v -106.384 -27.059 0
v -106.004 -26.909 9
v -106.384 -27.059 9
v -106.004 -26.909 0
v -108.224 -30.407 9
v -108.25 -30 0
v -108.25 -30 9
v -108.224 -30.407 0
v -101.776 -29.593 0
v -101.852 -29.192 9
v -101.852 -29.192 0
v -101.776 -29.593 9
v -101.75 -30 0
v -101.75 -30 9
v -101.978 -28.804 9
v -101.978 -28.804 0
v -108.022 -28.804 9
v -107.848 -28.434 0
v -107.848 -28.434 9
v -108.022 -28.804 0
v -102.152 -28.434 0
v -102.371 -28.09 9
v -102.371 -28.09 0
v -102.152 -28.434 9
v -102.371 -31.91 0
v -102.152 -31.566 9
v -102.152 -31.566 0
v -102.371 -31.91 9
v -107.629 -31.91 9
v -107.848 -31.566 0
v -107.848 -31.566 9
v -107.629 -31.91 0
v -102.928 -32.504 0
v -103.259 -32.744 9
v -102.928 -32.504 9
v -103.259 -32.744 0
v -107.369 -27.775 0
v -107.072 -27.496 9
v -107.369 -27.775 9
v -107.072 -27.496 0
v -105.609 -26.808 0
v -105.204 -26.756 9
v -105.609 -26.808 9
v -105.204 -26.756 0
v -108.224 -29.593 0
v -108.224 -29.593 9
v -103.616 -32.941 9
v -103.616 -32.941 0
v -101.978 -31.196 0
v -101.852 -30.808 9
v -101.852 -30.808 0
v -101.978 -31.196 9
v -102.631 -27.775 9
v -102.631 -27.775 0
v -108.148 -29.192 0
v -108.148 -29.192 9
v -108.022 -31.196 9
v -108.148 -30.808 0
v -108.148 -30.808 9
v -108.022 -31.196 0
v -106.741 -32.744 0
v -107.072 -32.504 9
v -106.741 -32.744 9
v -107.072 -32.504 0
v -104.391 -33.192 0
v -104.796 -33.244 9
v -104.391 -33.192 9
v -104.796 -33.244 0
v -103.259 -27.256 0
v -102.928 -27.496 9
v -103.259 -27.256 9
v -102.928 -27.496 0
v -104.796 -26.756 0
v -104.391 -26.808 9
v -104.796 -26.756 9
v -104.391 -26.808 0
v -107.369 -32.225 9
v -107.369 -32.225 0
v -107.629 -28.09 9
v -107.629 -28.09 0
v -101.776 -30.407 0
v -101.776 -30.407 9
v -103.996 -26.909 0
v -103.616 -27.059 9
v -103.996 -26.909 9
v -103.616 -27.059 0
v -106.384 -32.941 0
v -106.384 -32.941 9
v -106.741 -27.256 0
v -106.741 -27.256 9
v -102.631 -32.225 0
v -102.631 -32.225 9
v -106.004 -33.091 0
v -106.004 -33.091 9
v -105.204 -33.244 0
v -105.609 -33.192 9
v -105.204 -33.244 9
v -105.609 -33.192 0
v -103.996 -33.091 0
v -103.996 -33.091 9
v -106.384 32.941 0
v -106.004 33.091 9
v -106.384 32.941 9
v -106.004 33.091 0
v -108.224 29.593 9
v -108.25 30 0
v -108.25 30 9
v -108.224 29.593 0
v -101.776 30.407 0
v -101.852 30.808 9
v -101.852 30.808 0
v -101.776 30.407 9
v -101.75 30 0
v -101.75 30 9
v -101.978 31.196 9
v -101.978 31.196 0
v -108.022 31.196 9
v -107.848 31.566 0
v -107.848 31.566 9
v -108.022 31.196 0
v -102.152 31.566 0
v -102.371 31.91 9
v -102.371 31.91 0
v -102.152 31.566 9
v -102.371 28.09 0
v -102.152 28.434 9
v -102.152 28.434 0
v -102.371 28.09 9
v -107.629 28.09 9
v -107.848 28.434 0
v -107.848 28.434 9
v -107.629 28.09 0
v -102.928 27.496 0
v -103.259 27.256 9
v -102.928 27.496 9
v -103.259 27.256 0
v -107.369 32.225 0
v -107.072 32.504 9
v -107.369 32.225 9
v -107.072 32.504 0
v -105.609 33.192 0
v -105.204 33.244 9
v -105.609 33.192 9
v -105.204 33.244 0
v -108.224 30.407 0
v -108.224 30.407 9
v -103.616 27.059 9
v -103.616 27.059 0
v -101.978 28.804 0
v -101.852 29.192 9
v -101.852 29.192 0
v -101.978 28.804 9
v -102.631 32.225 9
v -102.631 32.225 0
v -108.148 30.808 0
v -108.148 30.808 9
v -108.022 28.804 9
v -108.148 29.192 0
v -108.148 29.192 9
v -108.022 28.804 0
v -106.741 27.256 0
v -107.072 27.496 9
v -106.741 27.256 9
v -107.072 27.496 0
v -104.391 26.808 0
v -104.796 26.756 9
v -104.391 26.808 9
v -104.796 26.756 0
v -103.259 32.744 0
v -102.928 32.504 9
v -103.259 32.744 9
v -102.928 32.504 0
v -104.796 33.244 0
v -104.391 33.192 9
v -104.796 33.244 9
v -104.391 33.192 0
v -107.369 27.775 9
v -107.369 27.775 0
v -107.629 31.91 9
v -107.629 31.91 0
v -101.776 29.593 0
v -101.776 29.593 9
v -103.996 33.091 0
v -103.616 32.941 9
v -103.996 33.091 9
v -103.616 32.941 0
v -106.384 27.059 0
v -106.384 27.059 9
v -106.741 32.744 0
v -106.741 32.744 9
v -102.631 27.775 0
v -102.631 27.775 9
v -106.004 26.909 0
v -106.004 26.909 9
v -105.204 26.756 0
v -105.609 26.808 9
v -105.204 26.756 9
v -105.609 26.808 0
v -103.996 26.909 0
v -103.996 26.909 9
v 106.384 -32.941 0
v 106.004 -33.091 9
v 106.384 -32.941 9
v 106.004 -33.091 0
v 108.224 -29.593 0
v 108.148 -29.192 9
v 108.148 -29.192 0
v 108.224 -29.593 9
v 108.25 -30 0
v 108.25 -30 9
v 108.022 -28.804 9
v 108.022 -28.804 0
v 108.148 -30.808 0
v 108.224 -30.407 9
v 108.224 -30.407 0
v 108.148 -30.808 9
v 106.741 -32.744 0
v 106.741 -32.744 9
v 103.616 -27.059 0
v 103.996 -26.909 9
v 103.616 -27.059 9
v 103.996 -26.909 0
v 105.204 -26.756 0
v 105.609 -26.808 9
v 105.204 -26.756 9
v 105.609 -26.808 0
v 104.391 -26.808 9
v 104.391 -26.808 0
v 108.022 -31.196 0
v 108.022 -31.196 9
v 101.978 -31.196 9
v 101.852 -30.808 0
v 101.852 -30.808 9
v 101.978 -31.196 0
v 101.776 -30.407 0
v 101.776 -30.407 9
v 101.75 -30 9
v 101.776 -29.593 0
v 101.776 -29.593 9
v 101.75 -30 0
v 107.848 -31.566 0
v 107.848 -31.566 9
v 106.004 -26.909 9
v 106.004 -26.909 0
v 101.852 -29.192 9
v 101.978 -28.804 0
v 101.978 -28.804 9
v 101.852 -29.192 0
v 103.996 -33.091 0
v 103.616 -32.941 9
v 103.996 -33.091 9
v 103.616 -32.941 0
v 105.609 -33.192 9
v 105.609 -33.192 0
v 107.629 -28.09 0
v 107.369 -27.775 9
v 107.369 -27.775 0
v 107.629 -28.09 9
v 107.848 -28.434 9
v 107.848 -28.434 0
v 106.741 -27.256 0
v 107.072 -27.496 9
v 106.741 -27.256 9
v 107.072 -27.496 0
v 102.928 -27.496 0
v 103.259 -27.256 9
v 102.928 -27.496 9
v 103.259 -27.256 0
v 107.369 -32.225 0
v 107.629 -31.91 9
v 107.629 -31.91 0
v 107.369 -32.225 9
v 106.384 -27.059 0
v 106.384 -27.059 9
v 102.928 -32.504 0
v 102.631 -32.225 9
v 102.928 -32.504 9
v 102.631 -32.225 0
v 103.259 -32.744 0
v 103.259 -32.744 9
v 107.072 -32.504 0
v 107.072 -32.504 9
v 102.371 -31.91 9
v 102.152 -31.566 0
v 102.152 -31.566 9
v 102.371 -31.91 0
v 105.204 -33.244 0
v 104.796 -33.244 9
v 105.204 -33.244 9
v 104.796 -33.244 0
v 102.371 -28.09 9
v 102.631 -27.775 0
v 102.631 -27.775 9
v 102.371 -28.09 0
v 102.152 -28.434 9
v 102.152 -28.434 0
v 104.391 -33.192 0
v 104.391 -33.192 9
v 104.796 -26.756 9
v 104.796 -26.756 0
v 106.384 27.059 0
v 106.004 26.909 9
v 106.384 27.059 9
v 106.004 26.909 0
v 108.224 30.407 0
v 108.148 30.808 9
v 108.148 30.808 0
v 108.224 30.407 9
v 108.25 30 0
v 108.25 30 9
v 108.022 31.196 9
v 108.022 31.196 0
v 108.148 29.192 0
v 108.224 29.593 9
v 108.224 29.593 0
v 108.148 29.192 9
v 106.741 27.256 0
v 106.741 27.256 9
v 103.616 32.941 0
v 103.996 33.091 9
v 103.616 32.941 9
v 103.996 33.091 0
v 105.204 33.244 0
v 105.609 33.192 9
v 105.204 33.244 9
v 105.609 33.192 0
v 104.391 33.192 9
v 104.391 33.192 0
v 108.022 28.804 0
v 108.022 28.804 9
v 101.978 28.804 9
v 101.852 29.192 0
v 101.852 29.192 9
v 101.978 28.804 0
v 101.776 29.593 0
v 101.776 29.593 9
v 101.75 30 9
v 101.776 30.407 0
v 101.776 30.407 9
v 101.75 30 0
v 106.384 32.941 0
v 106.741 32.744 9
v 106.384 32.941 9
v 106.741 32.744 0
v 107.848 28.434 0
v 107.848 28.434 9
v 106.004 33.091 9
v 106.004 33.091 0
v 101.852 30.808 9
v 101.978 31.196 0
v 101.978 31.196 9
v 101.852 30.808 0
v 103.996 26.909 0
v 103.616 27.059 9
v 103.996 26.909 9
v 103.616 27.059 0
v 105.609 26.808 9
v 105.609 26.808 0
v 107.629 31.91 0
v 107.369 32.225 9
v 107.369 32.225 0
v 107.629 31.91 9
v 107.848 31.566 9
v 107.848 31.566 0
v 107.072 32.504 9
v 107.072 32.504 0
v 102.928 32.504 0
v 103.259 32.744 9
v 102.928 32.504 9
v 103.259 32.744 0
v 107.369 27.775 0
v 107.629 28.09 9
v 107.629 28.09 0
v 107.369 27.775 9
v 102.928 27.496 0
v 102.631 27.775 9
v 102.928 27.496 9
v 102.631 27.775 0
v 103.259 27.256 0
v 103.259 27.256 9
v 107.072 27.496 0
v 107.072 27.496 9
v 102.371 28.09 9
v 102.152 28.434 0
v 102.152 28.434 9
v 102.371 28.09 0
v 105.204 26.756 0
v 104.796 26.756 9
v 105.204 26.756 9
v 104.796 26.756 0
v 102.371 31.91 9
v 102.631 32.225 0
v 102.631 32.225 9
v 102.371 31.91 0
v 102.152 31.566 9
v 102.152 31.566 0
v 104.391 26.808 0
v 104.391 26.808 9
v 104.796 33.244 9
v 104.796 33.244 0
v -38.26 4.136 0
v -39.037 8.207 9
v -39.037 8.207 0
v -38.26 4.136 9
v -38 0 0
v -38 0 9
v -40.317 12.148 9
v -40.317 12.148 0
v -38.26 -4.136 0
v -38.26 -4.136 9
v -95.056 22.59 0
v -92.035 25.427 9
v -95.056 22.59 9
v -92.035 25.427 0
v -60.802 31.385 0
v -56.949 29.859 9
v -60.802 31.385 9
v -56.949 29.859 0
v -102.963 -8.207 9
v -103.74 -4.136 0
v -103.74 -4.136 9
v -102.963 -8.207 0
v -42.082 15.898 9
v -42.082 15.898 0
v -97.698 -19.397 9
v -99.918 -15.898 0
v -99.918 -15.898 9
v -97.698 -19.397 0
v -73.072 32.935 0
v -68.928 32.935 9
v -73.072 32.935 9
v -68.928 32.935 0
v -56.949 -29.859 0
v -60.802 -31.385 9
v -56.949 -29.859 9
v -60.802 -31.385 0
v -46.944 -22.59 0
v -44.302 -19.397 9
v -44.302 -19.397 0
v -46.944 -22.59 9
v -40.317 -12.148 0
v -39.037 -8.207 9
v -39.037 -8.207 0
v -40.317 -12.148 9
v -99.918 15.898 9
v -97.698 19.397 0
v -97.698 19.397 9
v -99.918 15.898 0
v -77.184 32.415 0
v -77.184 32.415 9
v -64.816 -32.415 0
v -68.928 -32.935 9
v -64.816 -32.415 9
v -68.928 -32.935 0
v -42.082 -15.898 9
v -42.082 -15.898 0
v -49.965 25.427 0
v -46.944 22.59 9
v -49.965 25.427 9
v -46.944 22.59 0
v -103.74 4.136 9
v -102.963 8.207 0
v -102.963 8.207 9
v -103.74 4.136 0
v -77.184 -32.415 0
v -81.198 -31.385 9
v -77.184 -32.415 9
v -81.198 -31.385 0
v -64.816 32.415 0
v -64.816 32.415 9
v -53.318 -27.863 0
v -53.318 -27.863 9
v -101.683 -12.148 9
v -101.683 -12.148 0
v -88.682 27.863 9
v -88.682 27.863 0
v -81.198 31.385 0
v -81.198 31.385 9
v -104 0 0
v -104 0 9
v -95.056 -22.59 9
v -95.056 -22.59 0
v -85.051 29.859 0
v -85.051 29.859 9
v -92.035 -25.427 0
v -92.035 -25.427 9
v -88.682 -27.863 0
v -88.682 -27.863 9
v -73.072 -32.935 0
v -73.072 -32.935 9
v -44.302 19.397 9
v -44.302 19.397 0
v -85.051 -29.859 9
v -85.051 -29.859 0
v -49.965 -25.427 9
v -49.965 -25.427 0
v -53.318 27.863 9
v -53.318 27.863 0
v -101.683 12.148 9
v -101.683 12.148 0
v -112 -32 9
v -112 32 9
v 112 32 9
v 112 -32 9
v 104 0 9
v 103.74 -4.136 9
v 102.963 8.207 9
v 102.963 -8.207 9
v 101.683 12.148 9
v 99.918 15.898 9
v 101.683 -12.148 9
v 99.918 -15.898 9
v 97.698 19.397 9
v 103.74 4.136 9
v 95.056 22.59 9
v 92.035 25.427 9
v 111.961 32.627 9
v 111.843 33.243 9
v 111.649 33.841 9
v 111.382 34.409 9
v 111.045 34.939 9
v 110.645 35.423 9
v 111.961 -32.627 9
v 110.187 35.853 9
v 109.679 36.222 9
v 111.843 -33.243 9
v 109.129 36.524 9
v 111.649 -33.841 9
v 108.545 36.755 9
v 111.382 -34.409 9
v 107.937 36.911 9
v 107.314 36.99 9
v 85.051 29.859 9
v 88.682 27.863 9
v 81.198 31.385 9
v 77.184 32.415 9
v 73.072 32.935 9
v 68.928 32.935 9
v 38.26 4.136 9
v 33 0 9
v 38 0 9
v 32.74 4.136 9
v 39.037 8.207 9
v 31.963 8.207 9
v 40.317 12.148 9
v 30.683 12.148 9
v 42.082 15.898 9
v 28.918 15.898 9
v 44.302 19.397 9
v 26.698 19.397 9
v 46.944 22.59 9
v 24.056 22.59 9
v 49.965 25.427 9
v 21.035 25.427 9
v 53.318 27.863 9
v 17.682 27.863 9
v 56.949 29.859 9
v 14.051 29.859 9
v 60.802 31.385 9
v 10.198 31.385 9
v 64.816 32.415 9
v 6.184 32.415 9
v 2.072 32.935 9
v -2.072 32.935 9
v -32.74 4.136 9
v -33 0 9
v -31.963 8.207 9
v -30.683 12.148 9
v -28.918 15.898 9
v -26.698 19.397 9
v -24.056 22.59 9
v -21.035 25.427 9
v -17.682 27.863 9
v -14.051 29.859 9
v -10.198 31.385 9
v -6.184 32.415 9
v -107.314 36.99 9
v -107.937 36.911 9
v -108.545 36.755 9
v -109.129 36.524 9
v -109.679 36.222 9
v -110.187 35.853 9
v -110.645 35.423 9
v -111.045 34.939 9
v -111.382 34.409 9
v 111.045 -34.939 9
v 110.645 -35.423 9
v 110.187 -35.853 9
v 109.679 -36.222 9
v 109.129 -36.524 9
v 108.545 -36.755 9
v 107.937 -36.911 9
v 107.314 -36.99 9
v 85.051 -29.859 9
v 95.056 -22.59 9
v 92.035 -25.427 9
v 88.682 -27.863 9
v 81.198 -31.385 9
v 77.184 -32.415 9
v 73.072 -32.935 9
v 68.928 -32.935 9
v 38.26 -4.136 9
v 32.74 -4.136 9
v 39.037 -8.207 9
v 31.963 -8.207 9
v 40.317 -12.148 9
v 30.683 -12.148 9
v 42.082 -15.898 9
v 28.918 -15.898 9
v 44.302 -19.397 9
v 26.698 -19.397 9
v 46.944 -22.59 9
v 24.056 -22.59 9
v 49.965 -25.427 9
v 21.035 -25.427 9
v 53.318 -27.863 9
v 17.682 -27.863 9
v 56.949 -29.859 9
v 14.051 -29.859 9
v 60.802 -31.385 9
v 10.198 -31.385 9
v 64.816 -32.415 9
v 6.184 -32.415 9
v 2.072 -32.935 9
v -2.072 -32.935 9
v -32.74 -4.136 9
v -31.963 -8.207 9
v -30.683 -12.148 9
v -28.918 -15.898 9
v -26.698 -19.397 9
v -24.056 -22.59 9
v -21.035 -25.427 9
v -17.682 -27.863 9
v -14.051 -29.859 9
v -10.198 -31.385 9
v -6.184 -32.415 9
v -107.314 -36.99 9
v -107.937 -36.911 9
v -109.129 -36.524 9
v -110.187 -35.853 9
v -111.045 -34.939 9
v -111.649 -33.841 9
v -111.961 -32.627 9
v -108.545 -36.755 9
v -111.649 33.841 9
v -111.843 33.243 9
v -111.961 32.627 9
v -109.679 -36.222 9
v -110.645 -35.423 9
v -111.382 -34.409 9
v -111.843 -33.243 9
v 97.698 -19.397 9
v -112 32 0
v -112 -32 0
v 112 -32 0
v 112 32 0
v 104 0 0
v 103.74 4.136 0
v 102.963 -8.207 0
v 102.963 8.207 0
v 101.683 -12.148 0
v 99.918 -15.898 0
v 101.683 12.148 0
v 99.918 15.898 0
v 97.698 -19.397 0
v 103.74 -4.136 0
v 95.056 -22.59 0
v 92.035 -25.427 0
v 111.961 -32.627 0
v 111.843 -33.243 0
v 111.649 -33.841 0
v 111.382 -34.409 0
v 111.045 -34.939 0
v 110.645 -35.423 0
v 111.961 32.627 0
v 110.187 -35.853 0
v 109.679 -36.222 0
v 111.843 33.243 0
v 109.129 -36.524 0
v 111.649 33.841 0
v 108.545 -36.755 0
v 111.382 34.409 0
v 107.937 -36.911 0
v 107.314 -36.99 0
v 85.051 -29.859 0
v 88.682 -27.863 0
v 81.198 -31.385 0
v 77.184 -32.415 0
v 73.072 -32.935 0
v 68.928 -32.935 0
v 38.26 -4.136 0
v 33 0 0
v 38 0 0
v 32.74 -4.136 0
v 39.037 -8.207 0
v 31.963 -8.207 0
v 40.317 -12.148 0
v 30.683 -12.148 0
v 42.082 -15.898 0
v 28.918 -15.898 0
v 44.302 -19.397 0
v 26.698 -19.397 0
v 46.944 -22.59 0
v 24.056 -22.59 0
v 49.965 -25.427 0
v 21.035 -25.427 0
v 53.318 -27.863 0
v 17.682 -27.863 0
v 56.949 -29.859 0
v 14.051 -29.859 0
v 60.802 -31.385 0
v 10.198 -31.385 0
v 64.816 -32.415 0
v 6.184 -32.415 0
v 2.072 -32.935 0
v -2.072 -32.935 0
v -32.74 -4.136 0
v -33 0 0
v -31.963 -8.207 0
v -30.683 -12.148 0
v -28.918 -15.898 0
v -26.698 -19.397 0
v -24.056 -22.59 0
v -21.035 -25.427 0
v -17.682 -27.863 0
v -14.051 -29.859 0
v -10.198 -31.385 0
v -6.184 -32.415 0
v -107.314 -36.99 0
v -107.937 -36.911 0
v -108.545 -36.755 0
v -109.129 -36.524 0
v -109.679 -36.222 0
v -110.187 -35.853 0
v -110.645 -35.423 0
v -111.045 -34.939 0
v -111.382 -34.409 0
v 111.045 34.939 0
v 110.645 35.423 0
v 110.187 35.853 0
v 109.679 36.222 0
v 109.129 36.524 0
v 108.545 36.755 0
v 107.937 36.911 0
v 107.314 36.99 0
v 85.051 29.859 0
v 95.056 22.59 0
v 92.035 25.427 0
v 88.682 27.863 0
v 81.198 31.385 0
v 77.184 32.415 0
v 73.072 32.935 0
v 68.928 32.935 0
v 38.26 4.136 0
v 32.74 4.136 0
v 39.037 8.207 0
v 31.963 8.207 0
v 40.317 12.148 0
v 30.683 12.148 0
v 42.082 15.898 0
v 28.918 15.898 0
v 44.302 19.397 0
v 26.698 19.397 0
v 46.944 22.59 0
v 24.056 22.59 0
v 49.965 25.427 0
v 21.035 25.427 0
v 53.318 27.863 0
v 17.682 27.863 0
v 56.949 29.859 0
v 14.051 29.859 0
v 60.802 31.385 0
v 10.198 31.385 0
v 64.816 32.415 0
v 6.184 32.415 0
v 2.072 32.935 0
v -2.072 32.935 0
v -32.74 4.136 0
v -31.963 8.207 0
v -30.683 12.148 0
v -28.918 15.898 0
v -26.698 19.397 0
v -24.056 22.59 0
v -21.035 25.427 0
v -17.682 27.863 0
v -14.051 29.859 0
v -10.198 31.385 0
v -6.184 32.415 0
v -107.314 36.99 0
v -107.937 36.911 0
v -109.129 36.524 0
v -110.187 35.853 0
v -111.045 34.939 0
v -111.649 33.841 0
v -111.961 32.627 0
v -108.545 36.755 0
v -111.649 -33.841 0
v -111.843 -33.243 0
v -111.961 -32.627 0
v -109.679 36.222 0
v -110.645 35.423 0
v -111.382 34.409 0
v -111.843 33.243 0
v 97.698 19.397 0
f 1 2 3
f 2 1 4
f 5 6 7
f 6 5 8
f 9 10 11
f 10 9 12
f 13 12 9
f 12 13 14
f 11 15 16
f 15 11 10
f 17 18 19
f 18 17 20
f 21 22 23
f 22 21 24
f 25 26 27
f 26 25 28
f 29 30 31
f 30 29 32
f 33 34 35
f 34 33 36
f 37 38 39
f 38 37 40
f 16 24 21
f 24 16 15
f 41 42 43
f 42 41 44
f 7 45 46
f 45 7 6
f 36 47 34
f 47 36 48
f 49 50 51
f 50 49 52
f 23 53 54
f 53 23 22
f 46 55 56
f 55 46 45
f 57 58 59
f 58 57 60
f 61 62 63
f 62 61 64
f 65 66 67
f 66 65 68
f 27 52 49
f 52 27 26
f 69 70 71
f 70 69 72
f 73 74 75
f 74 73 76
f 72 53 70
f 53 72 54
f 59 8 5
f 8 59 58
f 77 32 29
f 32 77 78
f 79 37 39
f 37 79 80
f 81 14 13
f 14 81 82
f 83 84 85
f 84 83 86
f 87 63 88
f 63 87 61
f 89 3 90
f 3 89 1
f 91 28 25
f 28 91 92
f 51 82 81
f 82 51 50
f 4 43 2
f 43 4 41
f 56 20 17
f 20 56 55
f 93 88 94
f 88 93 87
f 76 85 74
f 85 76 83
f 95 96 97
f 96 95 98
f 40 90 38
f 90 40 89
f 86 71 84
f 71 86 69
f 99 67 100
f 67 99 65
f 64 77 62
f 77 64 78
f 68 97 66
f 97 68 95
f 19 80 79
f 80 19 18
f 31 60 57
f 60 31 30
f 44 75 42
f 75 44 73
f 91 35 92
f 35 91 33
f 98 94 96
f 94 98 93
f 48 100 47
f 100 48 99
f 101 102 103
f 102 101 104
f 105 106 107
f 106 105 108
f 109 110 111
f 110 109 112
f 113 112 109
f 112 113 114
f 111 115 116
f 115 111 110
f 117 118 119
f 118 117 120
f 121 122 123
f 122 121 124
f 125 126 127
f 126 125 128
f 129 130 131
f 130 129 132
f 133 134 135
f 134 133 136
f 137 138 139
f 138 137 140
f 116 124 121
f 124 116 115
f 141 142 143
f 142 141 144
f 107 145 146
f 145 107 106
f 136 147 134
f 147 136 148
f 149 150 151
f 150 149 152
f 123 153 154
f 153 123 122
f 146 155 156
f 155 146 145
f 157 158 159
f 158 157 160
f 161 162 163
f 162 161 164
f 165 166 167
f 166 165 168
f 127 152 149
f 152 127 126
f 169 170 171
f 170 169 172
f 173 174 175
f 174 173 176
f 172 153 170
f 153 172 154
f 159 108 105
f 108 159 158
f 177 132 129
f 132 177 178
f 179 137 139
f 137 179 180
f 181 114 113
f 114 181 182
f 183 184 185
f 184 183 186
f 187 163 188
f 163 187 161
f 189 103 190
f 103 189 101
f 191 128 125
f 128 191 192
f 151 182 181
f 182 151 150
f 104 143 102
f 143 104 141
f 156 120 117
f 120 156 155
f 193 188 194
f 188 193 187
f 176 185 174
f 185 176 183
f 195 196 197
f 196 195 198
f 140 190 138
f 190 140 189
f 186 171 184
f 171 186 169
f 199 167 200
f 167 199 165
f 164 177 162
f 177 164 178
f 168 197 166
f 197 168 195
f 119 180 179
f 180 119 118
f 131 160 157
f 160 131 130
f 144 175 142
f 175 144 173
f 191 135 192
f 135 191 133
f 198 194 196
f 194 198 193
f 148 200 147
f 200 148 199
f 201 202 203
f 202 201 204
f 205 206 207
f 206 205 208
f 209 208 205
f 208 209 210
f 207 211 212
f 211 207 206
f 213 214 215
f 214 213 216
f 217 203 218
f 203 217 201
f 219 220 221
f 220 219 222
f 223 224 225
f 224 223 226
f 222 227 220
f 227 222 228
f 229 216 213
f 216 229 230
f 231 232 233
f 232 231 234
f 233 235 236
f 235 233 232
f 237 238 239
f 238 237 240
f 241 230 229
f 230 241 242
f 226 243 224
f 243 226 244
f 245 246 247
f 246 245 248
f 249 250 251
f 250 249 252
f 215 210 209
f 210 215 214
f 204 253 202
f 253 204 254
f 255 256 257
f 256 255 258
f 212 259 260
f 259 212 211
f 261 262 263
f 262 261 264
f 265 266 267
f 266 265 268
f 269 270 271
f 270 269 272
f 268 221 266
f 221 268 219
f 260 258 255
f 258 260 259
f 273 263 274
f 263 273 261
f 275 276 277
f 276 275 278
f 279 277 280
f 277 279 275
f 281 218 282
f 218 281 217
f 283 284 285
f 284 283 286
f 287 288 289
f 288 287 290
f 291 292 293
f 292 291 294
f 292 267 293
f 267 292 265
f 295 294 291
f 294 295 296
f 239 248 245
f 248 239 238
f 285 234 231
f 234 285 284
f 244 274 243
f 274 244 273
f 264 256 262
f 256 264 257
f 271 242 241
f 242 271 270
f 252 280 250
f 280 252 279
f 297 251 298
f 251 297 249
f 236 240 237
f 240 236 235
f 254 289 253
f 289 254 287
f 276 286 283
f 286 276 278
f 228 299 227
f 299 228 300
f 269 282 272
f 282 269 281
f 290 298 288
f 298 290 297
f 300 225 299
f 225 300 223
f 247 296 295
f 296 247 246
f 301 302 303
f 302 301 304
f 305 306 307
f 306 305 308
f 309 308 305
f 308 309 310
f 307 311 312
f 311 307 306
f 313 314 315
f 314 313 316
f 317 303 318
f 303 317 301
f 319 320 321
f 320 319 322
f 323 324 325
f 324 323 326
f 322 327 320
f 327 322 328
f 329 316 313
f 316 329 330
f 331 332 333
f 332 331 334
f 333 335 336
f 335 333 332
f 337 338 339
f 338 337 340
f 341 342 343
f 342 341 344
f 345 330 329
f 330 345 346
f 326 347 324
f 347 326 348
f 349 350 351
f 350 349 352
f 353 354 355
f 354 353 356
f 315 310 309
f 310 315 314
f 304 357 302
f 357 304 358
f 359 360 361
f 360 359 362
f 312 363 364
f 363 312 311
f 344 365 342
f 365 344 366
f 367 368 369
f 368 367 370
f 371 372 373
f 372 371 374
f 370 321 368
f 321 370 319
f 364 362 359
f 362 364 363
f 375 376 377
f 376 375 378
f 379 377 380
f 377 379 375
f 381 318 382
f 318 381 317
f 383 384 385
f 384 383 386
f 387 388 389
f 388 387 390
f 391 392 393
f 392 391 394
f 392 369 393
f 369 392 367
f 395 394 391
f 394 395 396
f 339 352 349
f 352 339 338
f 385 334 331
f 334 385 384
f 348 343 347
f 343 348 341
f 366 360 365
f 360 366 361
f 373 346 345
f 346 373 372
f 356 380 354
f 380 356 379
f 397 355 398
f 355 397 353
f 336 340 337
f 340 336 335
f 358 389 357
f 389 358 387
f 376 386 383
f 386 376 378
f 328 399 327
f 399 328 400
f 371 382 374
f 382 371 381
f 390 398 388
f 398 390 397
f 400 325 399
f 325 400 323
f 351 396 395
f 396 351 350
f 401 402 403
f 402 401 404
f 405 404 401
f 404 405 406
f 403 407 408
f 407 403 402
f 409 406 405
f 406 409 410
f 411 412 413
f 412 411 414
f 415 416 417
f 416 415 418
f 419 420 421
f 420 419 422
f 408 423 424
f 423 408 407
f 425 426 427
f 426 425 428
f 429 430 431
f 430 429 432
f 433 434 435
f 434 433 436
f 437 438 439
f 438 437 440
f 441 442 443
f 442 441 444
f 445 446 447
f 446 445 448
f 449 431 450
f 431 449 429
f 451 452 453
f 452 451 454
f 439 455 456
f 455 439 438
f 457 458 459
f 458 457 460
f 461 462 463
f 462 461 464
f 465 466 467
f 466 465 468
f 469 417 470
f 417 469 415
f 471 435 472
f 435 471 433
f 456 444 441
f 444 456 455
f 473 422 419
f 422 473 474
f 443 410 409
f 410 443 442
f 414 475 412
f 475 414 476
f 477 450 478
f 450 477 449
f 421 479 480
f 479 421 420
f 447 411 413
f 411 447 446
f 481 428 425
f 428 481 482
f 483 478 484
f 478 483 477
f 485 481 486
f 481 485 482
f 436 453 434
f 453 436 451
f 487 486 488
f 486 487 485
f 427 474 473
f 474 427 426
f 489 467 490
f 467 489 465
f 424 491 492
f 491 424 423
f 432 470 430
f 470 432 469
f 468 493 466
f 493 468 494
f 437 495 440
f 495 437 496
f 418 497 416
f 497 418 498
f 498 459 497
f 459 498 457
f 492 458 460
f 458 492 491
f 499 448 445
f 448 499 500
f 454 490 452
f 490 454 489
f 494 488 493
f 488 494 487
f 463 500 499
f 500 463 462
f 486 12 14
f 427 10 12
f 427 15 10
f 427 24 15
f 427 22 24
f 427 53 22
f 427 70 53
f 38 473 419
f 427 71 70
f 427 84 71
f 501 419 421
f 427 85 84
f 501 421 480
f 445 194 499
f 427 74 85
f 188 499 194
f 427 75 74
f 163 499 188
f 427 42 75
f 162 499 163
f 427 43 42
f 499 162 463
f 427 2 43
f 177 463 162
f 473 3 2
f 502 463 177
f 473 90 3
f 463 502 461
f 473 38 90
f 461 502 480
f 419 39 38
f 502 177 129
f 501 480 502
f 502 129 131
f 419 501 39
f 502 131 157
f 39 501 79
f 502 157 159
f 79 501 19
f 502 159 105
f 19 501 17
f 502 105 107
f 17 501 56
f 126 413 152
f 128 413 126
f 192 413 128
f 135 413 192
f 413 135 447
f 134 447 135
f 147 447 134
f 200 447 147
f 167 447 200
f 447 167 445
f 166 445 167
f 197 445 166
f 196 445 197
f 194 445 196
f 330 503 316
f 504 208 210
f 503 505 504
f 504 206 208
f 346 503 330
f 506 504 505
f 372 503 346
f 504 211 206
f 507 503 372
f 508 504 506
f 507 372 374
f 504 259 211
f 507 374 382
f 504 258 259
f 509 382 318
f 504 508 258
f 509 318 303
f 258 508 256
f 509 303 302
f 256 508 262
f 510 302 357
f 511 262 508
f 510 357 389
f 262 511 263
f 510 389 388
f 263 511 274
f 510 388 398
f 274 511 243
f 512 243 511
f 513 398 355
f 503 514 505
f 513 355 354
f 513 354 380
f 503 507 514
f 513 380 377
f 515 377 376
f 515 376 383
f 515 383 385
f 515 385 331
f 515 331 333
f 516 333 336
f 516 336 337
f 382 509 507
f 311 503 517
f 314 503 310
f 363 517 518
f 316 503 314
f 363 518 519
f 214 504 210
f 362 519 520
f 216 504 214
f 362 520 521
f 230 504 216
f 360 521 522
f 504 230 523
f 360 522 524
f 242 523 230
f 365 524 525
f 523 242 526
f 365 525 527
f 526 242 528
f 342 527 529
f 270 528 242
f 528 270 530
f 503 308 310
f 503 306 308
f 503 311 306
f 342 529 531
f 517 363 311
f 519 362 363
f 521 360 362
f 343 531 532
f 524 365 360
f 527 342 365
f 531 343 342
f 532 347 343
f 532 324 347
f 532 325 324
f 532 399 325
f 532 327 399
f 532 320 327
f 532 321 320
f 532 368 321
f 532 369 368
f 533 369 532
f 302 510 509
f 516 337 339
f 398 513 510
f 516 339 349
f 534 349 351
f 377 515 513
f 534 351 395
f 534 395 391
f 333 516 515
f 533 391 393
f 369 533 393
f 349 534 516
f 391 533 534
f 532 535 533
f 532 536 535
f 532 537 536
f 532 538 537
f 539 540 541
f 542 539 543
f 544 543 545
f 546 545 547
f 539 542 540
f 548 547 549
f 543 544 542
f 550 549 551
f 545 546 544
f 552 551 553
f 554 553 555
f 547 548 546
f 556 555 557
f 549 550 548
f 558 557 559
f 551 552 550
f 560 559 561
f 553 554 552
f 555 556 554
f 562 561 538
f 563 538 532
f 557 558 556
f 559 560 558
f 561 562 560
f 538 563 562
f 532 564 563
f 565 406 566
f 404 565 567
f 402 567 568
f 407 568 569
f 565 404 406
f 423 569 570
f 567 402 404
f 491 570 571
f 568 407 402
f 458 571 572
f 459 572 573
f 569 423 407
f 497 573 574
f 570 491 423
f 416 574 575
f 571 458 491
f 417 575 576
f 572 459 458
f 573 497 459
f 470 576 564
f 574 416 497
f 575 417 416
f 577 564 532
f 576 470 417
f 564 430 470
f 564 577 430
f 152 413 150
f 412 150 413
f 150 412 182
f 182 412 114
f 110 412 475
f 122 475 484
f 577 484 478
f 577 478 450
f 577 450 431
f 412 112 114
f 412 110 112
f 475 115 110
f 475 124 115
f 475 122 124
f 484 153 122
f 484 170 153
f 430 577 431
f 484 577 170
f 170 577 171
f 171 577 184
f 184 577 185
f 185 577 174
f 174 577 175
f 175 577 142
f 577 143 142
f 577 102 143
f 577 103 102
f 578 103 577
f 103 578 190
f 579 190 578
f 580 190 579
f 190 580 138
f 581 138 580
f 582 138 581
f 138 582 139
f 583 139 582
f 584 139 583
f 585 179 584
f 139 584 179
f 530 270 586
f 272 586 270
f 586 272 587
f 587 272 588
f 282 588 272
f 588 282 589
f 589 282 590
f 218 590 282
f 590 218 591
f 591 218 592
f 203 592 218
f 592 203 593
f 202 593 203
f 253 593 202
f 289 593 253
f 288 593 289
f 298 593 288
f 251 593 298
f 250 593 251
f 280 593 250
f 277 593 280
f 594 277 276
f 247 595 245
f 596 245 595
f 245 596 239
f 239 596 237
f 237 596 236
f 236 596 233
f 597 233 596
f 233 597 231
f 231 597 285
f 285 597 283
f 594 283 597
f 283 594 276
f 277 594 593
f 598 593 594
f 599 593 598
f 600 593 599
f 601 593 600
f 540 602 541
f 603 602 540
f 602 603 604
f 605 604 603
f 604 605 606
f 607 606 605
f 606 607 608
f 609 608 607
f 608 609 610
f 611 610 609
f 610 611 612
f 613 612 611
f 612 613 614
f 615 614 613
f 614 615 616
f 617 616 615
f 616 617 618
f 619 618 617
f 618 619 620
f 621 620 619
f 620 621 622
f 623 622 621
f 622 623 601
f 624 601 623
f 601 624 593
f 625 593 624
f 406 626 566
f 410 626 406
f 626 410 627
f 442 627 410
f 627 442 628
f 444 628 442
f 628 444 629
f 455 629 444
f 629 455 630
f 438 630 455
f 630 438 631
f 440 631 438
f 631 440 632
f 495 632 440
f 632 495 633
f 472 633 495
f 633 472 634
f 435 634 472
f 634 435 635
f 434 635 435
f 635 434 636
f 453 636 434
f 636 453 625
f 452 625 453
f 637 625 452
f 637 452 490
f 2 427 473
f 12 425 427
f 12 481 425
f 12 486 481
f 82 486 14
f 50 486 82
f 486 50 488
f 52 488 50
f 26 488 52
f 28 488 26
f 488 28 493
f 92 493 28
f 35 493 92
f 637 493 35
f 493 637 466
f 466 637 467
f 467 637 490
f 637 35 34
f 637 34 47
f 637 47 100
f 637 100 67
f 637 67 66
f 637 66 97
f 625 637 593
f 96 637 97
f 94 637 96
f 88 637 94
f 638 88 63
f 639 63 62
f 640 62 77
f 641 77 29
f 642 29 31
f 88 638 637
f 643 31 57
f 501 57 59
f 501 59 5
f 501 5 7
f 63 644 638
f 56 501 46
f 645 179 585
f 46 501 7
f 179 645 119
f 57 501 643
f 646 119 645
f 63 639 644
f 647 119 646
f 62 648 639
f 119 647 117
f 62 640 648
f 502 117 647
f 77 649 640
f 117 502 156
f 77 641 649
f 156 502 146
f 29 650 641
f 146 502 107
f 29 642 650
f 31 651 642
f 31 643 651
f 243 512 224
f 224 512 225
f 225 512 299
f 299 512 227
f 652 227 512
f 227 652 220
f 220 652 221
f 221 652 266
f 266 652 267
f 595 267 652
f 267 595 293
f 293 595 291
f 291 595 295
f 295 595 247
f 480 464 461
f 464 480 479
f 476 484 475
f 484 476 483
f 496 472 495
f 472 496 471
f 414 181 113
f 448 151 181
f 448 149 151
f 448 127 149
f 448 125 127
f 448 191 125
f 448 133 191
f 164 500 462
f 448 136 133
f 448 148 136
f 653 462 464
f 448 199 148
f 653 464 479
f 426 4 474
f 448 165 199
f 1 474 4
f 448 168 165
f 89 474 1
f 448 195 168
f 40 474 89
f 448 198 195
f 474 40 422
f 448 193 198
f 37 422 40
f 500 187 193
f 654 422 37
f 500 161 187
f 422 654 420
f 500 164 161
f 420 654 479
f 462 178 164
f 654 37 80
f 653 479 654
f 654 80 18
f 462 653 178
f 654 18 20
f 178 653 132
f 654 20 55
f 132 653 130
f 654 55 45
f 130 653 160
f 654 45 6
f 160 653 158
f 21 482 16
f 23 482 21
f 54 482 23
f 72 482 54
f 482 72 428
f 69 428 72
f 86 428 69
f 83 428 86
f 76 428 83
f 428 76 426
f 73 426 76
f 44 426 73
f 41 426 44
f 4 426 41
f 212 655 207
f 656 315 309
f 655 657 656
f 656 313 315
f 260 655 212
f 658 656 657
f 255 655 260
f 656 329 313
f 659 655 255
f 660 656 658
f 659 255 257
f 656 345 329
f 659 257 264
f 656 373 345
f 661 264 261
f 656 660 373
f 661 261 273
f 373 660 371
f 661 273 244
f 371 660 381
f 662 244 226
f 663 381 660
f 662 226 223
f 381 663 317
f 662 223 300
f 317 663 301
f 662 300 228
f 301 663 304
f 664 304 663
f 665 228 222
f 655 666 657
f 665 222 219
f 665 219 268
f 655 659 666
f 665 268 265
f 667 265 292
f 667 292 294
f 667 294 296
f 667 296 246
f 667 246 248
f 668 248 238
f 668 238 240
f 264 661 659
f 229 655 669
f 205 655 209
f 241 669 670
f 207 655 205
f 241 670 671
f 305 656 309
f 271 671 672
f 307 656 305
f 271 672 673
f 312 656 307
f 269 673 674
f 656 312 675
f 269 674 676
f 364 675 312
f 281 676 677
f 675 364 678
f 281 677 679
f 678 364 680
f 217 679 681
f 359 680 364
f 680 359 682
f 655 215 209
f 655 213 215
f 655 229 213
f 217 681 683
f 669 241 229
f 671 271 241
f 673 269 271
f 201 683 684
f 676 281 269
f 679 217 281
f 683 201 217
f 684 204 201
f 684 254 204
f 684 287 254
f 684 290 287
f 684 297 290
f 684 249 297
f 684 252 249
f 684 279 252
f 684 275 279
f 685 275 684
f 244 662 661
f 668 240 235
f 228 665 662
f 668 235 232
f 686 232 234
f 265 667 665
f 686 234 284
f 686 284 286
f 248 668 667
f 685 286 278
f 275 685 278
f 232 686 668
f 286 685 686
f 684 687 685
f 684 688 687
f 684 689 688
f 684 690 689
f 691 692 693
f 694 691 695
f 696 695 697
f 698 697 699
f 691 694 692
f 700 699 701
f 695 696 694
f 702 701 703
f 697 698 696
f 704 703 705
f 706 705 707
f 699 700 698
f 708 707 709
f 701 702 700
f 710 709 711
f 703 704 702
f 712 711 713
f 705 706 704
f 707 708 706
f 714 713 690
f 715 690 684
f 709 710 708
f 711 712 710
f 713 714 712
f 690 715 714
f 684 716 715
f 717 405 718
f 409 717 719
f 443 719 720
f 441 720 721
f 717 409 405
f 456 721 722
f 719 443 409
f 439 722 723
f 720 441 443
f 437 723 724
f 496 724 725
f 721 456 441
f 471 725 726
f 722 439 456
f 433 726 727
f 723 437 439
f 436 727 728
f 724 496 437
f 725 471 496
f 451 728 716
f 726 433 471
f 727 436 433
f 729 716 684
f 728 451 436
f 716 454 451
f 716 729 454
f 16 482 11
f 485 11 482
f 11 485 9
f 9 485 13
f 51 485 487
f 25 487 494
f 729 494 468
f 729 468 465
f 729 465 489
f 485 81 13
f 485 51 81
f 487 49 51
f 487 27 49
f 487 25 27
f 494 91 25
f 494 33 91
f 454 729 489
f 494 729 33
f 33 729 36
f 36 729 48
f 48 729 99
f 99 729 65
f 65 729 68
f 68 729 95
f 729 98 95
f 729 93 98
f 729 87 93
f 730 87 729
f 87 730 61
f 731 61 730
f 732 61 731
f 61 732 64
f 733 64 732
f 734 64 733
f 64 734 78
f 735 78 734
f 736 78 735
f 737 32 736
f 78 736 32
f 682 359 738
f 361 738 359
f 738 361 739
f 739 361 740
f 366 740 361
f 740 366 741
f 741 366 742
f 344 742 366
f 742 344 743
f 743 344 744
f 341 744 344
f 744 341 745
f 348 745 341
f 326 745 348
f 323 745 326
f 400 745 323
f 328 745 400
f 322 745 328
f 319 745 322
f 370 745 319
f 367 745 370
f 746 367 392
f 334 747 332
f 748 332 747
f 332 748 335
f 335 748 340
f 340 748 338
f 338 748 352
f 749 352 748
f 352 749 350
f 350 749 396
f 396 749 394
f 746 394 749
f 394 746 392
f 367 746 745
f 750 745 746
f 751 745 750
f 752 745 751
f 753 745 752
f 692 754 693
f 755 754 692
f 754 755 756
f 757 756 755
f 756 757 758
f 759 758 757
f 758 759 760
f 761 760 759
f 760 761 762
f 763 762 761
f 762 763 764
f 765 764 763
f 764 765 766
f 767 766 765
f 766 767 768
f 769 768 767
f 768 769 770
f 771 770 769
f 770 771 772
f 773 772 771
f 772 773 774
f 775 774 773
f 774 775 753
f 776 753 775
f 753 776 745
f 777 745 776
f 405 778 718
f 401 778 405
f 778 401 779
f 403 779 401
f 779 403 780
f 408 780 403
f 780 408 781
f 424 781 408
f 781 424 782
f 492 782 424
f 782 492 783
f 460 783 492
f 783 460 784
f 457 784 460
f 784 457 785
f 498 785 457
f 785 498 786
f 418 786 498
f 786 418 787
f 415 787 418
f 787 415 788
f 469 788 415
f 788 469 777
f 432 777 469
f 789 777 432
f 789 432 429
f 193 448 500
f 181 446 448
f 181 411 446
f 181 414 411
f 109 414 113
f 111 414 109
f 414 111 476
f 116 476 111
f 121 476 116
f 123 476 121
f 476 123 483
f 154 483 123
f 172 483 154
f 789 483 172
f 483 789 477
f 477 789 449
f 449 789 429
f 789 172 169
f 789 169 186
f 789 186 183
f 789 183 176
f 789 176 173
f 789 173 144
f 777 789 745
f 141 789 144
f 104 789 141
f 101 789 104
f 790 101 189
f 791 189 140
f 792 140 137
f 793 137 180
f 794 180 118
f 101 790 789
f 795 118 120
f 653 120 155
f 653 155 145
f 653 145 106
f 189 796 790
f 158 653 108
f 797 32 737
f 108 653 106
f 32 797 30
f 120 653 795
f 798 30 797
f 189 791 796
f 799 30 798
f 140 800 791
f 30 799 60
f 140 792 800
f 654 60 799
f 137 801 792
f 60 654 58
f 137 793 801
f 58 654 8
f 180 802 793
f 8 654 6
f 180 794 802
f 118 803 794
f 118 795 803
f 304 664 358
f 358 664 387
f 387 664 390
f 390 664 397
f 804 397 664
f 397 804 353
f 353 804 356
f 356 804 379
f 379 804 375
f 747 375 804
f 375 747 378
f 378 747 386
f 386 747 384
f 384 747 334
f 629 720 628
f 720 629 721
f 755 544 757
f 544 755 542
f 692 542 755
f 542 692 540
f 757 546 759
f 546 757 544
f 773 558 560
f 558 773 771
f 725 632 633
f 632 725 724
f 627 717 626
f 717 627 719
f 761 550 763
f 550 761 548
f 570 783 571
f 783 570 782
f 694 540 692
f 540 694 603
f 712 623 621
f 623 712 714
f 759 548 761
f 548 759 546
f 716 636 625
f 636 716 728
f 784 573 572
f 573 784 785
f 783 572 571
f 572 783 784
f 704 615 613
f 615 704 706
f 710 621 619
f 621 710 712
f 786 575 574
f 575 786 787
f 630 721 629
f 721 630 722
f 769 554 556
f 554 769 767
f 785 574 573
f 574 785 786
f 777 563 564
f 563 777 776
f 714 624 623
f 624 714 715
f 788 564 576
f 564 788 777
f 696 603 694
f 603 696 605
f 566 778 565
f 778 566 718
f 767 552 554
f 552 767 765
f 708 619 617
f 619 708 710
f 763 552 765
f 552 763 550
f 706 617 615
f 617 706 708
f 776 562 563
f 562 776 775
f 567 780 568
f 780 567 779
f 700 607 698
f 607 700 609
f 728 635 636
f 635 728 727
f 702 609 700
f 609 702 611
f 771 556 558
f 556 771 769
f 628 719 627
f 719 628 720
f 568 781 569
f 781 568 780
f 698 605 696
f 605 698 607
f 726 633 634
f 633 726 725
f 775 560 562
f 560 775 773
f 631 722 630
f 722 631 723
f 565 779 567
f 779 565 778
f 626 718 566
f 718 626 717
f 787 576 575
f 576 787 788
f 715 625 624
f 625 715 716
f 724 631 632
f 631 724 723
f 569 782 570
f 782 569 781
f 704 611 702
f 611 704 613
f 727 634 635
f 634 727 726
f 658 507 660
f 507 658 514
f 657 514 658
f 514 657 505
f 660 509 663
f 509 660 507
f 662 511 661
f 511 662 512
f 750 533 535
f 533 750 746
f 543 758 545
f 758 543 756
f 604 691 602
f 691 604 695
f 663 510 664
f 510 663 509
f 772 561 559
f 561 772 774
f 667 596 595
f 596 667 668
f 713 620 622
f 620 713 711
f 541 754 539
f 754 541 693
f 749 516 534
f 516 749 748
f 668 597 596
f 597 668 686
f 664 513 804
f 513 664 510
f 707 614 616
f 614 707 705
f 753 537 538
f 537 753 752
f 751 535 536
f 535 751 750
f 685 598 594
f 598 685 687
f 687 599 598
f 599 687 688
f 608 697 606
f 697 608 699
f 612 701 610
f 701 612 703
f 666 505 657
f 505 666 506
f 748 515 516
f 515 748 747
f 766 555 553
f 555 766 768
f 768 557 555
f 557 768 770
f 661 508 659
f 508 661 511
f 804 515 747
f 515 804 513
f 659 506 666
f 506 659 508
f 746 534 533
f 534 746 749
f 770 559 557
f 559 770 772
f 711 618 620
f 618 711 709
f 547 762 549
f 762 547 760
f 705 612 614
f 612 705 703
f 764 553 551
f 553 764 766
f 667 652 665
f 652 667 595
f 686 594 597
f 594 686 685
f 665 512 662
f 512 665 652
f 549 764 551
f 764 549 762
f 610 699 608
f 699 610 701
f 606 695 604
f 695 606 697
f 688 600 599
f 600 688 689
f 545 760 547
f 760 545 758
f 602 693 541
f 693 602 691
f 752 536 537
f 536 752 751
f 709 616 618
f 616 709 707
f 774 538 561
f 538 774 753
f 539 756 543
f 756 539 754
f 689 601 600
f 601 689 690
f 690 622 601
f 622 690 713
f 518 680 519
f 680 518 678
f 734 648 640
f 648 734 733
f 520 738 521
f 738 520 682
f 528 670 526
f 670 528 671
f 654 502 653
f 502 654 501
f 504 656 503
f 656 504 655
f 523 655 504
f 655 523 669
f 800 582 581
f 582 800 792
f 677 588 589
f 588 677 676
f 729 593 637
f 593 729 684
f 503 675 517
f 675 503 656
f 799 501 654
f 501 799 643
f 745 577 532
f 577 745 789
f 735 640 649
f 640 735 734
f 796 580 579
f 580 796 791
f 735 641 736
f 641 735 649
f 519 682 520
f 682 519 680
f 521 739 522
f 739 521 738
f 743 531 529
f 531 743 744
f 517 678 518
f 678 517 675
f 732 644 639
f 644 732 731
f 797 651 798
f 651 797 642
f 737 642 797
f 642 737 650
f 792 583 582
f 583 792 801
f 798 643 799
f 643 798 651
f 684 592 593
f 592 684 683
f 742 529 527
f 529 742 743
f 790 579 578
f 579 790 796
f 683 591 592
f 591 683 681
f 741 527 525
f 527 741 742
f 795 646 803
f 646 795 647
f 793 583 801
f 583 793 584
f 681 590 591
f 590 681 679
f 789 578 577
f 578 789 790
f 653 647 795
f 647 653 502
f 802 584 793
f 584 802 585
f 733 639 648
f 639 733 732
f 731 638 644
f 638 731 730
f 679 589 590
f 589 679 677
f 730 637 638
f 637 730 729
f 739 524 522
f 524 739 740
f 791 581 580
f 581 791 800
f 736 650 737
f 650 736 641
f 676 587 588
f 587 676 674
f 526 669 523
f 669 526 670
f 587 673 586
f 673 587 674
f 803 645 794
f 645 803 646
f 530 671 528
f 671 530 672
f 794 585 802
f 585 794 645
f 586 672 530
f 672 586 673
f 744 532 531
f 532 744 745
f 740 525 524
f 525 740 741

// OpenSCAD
$fn = 50;


difference() {
	union() {
		hull() {
			translate(v = [-107.0000000000, 32.0000000000, 0]) {
				cylinder(h = 9, r = 5);
			}
			translate(v = [107.0000000000, 32.0000000000, 0]) {
				cylinder(h = 9, r = 5);
			}
			translate(v = [-107.0000000000, -32.0000000000, 0]) {
				cylinder(h = 9, r = 5);
			}
			translate(v = [107.0000000000, -32.0000000000, 0]) {
				cylinder(h = 9, r = 5);
			}
		}
	}
	union() {
		#translate(v = [-105.0000000000, -30.0000000000, -100.0000000000]) {
			cylinder(h = 200, r = 3.2500000000);
		}
		#translate(v = [-105.0000000000, 30.0000000000, -100.0000000000]) {
			cylinder(h = 200, r = 3.2500000000);
		}
		#translate(v = [105.0000000000, -30.0000000000, -100.0000000000]) {
			cylinder(h = 200, r = 3.2500000000);
		}
		#translate(v = [105.0000000000, 30.0000000000, -100.0000000000]) {
			cylinder(h = 200, r = 3.2500000000);
		}
		#translate(v = [-71.0000000000, 0, 0]) {
			cylinder(h = 9, r = 33.0000000000);
		}
		#cylinder(h = 9, r = 33.0000000000);
		#translate(v = [71.0000000000, 0, 0]) {
			cylinder(h = 9, r = 33.0000000000);
		}
	}
}
